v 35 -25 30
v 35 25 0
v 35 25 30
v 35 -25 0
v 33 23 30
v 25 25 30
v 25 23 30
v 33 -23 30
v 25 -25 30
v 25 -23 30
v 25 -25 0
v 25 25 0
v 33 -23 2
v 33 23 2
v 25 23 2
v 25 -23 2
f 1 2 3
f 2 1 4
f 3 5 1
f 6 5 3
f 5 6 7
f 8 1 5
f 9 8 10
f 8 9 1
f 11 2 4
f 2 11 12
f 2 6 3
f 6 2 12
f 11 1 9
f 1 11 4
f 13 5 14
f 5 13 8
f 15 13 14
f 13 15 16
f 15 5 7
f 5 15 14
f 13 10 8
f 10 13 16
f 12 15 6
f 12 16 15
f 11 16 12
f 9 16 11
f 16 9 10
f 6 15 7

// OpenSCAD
// Built by bench/smallmodels/features/compiler.py from a list of features.
$fn = 64;
difference() {
  difference() {
  union() {
    translate([0, 0, 0]) translate([-35, -25, 0]) cube([70, 50, 30]);
    translate([0, 0, 0]) translate([-32.8, -22.8, 0]) cube([65.6, 45.6, 2]);
  }
  translate([-33, -23, 2]) cube([66, 46, 29]);  // shell, wall 2, open top
}
  union() {
    translate([-10, 0, 0]) rotate([0, 0, 0]) translate([-35, -25, 0]) cube([70, 50, 30]);
  }
}
